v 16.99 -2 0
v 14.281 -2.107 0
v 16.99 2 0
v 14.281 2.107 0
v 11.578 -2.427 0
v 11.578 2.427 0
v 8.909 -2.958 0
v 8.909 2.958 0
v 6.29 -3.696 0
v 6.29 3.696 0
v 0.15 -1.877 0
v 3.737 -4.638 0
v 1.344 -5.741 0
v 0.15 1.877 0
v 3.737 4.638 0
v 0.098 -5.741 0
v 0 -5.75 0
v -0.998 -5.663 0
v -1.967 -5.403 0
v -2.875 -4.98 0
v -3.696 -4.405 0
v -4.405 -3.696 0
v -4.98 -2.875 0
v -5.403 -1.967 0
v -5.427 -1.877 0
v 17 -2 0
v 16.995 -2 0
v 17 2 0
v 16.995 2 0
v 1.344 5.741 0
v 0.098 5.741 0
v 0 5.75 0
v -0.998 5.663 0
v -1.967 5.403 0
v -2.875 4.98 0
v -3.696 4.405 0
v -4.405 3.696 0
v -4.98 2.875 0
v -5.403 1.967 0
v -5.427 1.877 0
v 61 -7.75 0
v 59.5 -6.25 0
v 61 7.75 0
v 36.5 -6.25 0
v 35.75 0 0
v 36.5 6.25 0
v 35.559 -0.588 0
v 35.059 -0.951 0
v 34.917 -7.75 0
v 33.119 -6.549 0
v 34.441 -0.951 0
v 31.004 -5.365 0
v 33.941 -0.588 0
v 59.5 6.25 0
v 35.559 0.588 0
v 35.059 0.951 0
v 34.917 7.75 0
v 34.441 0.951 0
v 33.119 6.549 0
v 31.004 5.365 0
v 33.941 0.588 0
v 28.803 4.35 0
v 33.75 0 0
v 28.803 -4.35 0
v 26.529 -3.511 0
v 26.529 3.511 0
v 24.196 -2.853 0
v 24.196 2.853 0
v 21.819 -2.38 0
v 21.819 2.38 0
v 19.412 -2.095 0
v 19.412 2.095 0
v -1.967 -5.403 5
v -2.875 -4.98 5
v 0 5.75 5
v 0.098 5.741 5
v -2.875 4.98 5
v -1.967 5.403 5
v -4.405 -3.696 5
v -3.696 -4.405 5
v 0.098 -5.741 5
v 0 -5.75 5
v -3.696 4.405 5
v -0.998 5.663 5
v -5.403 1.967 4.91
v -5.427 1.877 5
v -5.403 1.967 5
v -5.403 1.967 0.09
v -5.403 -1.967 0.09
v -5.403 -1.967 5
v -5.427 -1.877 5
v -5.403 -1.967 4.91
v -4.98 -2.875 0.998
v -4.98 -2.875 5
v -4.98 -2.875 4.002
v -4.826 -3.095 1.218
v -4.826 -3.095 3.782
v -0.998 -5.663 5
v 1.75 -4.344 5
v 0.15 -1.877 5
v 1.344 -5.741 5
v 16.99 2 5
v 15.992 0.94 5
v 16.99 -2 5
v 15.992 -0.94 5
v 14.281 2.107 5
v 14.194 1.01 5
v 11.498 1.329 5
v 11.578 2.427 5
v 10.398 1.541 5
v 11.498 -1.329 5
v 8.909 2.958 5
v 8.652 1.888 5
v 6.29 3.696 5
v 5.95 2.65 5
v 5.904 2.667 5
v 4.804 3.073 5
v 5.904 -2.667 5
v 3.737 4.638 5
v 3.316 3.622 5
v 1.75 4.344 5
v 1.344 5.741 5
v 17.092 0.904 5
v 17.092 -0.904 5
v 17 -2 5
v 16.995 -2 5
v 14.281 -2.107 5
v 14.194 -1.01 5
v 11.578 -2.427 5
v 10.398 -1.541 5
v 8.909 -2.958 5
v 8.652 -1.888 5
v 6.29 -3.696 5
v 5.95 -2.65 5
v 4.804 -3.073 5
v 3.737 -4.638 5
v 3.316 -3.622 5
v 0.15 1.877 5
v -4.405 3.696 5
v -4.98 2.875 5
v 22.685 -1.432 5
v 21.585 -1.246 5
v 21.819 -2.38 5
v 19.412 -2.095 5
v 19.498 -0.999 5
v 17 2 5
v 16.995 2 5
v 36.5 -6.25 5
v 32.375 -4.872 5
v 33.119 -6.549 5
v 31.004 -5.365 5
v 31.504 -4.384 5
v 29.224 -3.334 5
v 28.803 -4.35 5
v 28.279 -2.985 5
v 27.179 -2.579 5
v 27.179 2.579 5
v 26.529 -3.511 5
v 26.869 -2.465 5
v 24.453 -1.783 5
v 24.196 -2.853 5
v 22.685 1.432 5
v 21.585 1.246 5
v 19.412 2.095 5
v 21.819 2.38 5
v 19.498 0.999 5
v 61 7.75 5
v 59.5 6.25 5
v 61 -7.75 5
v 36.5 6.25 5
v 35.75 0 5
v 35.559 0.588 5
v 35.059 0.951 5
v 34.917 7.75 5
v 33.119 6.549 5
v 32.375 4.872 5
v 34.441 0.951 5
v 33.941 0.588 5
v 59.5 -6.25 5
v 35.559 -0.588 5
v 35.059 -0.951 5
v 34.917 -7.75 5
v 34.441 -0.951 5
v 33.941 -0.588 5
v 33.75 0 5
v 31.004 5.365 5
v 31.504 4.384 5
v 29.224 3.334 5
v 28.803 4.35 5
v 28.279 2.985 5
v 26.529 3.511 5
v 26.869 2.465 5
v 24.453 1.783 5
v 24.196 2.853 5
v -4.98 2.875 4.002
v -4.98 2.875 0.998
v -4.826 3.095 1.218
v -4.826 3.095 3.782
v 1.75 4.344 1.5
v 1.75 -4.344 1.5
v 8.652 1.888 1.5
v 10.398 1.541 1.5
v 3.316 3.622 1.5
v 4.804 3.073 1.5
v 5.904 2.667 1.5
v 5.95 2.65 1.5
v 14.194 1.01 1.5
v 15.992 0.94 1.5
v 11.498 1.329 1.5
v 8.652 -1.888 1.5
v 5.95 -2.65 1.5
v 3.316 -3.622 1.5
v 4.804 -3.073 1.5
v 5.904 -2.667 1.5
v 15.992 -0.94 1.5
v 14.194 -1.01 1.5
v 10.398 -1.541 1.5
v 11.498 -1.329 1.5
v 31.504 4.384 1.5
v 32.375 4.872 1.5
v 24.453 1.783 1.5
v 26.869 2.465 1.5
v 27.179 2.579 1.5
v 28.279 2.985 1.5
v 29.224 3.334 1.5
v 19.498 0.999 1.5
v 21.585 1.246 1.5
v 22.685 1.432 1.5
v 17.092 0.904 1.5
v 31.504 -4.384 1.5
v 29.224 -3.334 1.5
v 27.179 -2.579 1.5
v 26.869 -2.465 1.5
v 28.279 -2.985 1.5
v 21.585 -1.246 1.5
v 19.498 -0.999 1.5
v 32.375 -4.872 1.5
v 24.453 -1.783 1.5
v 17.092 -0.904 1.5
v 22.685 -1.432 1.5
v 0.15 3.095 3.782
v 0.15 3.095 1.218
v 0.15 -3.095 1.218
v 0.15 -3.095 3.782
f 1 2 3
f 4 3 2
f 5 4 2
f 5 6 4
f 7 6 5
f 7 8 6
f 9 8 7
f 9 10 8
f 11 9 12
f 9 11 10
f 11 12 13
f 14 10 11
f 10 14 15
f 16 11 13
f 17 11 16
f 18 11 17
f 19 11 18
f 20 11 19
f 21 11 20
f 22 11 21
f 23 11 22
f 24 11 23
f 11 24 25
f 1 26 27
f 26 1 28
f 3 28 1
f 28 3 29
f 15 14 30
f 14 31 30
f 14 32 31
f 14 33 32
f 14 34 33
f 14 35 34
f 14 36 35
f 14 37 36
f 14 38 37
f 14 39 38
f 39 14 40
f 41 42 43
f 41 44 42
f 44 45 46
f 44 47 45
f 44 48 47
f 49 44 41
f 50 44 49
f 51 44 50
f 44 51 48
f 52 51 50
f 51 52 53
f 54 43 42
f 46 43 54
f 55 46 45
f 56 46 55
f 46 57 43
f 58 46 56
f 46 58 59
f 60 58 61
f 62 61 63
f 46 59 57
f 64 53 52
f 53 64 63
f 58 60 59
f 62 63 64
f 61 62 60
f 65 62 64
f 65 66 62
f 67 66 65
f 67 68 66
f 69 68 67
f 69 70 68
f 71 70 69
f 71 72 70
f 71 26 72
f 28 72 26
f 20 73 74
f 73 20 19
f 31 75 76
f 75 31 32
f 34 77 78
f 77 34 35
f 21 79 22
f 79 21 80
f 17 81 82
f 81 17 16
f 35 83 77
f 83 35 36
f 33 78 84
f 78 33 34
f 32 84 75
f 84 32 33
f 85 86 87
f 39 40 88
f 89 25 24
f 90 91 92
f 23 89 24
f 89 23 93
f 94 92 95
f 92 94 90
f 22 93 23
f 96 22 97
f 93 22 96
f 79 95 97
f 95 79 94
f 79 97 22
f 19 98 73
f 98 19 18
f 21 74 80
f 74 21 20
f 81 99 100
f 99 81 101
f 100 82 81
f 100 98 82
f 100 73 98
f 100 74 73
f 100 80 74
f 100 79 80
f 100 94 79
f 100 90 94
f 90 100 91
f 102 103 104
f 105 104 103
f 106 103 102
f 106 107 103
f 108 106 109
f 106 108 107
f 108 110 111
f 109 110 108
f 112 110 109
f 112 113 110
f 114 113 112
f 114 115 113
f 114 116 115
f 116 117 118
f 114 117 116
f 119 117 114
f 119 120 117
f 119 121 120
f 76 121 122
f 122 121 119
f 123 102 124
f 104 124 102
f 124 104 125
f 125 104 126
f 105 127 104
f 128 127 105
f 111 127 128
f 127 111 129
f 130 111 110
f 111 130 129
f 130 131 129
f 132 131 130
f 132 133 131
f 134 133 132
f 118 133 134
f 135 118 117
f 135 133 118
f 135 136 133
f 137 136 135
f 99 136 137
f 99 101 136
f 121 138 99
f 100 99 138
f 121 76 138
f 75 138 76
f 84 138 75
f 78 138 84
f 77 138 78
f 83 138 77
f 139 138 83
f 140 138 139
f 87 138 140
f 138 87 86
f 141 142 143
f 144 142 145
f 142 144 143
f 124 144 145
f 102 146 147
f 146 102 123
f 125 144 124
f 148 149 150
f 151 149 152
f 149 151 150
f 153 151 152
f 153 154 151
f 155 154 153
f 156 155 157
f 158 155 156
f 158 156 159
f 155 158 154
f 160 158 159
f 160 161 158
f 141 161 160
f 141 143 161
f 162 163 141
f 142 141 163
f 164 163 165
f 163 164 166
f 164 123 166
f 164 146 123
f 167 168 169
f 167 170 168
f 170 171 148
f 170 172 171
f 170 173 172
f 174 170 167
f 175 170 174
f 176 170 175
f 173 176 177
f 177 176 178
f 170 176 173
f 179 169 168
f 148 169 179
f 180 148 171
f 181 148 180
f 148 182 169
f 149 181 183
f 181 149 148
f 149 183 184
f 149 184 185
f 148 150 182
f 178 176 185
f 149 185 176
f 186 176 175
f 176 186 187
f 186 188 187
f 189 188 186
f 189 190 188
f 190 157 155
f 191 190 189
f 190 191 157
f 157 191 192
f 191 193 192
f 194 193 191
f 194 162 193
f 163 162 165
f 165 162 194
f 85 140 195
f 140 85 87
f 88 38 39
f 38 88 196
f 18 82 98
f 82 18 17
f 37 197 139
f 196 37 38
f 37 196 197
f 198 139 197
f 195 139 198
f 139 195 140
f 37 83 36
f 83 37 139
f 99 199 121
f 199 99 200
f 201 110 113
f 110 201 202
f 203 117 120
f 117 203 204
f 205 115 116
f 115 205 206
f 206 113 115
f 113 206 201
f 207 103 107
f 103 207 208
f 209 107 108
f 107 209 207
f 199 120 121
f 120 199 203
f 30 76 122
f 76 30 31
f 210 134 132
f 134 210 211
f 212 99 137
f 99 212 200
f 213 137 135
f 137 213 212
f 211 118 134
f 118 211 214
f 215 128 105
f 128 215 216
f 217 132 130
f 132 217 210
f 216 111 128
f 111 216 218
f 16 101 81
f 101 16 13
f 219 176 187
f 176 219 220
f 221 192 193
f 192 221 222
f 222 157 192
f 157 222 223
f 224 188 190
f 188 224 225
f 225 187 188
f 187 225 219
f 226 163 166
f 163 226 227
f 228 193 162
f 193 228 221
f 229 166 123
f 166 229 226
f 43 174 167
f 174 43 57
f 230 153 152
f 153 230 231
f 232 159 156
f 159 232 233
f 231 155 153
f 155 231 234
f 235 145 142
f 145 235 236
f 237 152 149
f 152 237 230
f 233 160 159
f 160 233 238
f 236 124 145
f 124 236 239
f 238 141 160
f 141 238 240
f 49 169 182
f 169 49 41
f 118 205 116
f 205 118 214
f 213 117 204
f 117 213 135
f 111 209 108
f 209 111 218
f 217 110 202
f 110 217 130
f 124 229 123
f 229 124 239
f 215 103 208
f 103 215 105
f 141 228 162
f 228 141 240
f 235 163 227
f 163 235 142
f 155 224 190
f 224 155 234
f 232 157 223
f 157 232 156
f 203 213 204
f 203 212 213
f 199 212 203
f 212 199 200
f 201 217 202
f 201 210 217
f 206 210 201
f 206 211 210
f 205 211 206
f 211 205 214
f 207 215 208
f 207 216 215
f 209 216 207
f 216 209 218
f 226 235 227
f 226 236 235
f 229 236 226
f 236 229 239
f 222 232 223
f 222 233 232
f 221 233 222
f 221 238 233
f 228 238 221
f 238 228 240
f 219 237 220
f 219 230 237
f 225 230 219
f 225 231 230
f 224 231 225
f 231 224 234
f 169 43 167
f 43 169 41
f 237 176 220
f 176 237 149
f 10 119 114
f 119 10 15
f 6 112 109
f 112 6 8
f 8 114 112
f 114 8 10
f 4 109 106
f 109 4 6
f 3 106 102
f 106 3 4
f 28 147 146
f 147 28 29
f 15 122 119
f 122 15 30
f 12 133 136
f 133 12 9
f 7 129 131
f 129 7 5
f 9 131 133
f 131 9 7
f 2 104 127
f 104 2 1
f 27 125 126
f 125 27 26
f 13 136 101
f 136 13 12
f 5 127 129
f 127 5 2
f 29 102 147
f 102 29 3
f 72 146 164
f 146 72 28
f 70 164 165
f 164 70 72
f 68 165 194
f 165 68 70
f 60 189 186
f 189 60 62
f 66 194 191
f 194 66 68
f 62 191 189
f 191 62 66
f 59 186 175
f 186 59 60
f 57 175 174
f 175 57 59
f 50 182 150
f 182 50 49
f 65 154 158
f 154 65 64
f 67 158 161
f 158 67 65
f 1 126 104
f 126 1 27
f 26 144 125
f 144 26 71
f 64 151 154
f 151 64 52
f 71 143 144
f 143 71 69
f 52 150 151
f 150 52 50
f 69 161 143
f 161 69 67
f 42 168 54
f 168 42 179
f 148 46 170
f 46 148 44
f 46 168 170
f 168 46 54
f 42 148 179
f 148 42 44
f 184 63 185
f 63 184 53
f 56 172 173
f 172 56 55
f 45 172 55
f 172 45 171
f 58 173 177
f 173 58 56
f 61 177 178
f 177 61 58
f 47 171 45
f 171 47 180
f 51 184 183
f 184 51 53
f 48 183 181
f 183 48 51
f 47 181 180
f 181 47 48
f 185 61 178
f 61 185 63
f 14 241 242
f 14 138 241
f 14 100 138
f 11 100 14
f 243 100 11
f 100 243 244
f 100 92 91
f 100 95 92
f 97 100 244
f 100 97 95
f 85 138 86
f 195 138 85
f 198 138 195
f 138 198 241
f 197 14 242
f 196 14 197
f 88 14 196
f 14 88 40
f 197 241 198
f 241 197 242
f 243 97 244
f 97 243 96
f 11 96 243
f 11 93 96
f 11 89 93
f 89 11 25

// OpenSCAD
// leg length and servo center position  
servoposition=48;

// constrinction's position (middle part)
cons = 17;

// Thickness of the middle part
ralt=4;	

// Servo boarder thickness
svbt=1.5;

// Number of sabilizers
num=5;		
		
// Rubber clamp diameter 	
plateau =11.5;   
	
// Bottom wall height
wall=1.5;	
		
// Bridge sabiziber width
stab=1.1;			

// Overall thickness of the leg		
zdim=5;		

// Servo length
sl = 23;

// Servo width
sw = 12.5;	

// Servo mounting holes radius
smhr = 1;

// Servo mounting holes distance
smhd = 26.5;

// rubber diameter
rubd = 6.7;

// rubber retension height
rubh = 6;

// Do you need two servo mounting holes?
two_se = false;


//////////////////////////////////////////////////////////////////////////////////////////////
// Servo rubber leg
//
// Copyright (C) 2013  Lochner, Juergen
// http://www.thingiverse.com/Ablapo/designs
//
// This program is free software; you can redistribute it and/or
// modify it under the terms of the GNU General Public License
// as published by the Free Software Foundation; either version 2
// of the License, or (at your option) any later version.
//
// This program is distributed in the hope that it will be useful,
// but WITHOUT ANY WARRANTY; without even the implied warranty of
// MERCHANTABILITY or FITNESS FOR A PARTICULAR PURPOSE.  See the
// GNU General Public License for more details.
//
// You should have received a copy of the GNU General Public License
// along with this program; if not, write to the Free Software
// Foundation, Inc., 51 Franklin Street, Fifth Floor, Boston, MA  02110-1301, USA.
/////////////////////////////////////////////////////////////////////////////////////////////////


module servo(){
	cube([sl,sw,40],center=true);
	translate([-smhd/2,0,0]) cylinder(r=smhr, h=40,center=true,$fn=10);
	if (two_se==true) {translate([smhd/2,0,0]) cylinder(r=smhr, h=40,center=true,$fn=10);}
}



nustart=(servoposition-sl/2-svbt-plateau/4)/(num+1);										// calculate start position for sabilizers
nudist=(servoposition-sl/2-svbt-plateau/8)/(num+1);										// calculate distance of stabilizers

rcut = ( cons*cons +ralt*ralt/4 - plateau*plateau/4)/2/(plateau/2-ralt/2);				// rubber, calculate cutting radius
bwidth = plateau/2* sin(atan((ralt/2+rcut)/ralt*2) )*2;									// rubber, calculate bridge width

bwidth_sv=sw+svbt*2;																// servo, calculate bridge width

svalpha=60;
svplat=(sw/2+svbt)/sin(svalpha)*2 ;
svcons=servoposition-cons-sl/2-svbt+cos(svalpha)*svplat/2;

//#translate([cons+svcons,0,0])cylinder(h=zdim,r=svplat/2);

svrcut = ( svcons*svcons +ralt*ralt/4 - svplat*svplat/4)/2/(svplat/2-ralt/2);				// servo, calculate cutting radius



rubcut=1.5+rubh-plateau/2;															// rubber clamp cut position

difference(){
	union(){	
		difference(){																									// rubber clamp
			translate([0,0,(zdim)/2]) cylinder (h=zdim,r=plateau/2, center=true,$fn=36);								
			if (rubcut>1.5) {translate([(plateau+1)/2+rubcut,0,(zdim+2)/2-1]) cube ([plateau+1,plateau+1,zdim+2], center=true);}
			else {translate([(plateau+1)/2+1.5,0,(zdim+2)/2-1]) cube ([plateau+1,plateau+1,zdim+2], center=true);}		
		}

		translate([cons/2,0,wall/2]) cube([cons,bwidth,wall],center=true);											// bridge bottom wall rubber part
		translate([(servoposition-cons)/2+cons,0,wall/2]) cube([servoposition-cons,bwidth_sv,wall],center=true);		// bridge bottom wall servo part



		intersection(){																									// upper side wall rubber part
			translate([cons,rcut+ralt/2,zdim/2]) cylinder (h=zdim+1,r=rcut+stab, center=true,$fn=80);	
			translate([cons/2,0,zdim/2]) cube([cons,bwidth,zdim],center=true);		
		}
		intersection(){																									// lower side wall rubber part
			translate([cons,-(rcut+ralt/2),zdim/2]) cylinder (h=zdim+1,r=rcut+stab, center=true,$fn=80);	
			translate([cons/2,0,zdim/2]) cube([cons,bwidth,zdim],center=true);		
		}


		intersection(){																									// upper side wall servo part
			translate([cons-0.01,svrcut+ralt/2,zdim/2]) cylinder (h=zdim+1,r=svrcut+stab, center=true,$fn=80);	
			translate([svcons/2+cons-0.01,0,zdim/2]) cube([svcons,bwidth_sv,zdim],center=true);		
		}
		intersection(){																									// lower side wall servo part
			translate([cons-0.01,-(svrcut+ralt/2),zdim/2]) cylinder (h=zdim+1,r=svrcut+stab, center=true,$fn=80);	
			translate([svcons/2+cons-0.01,0,zdim/2]) cube([svcons,bwidth_sv,zdim],center=true);		
		}


		for (i = [0:1:num-1]) {translate([nustart+i*nudist,0,zdim/2]) cube([stab,bwidth,zdim],center=true);	}		// stabilizers

		if (two_se!=true) {translate ([servoposition-(smhd-sl)/2*1.5/2,0,zdim/2]) cube([sl+2*svbt+(smhd-sl)/2*1.5,sw+2*svbt,zdim], center=true);}			// servo frame 1 mounting hole
		else  {translate ([servoposition,0,zdim/2]) cube([sl+(smhd-sl)/2*2.2*2,sw+2*svbt,zdim], center=true);}	// servo frame with 2 mounting holes	
	
		
	}

	
	translate([cons,rcut+ralt/2,zdim/2]) difference(){ 								// cut round shape upper rubber part
			cylinder (h=zdim+1,r=rcut, center=true,$fn=80);										
			translate([rcut/2,-(rcut+1)/2,0]) cube ([rcut,rcut+1,zdim+2],center=true);
			}

	translate([cons,-(rcut+ralt/2),zdim/2]) difference(){ 							// cut round shape lower rubber part
			cylinder (h=zdim+1,r=rcut, center=true,$fn=80);		
			translate([rcut/2, (rcut+1)/2,0]) cube ([rcut,rcut+1,zdim+2],center=true);
			}

	translate([cons-0.01,svrcut+ralt/2,zdim/2]) difference(){ 								// cut round shape upper servo part
			cylinder (h=zdim+1,r=svrcut, center=true,$fn=80);										
			translate([-svrcut/2,-(svrcut+1)/2,0]) cube ([svrcut,svrcut+1,zdim+2],center=true);
			}

	translate([cons-0.01,-(svrcut+ralt/2),zdim/2]) difference(){ 							// cut round shape lower servo part
			cylinder (h=zdim+1,r=svrcut, center=true,$fn=80);		
			translate([-svrcut/2, (svrcut+1)/2,0]) cube ([svrcut,svrcut+1,zdim+2],center=true);
			}


#	translate([servoposition,0,0]) servo();		// servo mount cut
	translate([-plateau/2+rubh/2-0.1,0,+rubd/2-(rubd-zdim)/2]) rotate([ 0,90,0])rotate([0,0,360/2/8]) cylinder(r=rubd/2,h=rubh,center=true,$fn=8);  // cut rubber
}
